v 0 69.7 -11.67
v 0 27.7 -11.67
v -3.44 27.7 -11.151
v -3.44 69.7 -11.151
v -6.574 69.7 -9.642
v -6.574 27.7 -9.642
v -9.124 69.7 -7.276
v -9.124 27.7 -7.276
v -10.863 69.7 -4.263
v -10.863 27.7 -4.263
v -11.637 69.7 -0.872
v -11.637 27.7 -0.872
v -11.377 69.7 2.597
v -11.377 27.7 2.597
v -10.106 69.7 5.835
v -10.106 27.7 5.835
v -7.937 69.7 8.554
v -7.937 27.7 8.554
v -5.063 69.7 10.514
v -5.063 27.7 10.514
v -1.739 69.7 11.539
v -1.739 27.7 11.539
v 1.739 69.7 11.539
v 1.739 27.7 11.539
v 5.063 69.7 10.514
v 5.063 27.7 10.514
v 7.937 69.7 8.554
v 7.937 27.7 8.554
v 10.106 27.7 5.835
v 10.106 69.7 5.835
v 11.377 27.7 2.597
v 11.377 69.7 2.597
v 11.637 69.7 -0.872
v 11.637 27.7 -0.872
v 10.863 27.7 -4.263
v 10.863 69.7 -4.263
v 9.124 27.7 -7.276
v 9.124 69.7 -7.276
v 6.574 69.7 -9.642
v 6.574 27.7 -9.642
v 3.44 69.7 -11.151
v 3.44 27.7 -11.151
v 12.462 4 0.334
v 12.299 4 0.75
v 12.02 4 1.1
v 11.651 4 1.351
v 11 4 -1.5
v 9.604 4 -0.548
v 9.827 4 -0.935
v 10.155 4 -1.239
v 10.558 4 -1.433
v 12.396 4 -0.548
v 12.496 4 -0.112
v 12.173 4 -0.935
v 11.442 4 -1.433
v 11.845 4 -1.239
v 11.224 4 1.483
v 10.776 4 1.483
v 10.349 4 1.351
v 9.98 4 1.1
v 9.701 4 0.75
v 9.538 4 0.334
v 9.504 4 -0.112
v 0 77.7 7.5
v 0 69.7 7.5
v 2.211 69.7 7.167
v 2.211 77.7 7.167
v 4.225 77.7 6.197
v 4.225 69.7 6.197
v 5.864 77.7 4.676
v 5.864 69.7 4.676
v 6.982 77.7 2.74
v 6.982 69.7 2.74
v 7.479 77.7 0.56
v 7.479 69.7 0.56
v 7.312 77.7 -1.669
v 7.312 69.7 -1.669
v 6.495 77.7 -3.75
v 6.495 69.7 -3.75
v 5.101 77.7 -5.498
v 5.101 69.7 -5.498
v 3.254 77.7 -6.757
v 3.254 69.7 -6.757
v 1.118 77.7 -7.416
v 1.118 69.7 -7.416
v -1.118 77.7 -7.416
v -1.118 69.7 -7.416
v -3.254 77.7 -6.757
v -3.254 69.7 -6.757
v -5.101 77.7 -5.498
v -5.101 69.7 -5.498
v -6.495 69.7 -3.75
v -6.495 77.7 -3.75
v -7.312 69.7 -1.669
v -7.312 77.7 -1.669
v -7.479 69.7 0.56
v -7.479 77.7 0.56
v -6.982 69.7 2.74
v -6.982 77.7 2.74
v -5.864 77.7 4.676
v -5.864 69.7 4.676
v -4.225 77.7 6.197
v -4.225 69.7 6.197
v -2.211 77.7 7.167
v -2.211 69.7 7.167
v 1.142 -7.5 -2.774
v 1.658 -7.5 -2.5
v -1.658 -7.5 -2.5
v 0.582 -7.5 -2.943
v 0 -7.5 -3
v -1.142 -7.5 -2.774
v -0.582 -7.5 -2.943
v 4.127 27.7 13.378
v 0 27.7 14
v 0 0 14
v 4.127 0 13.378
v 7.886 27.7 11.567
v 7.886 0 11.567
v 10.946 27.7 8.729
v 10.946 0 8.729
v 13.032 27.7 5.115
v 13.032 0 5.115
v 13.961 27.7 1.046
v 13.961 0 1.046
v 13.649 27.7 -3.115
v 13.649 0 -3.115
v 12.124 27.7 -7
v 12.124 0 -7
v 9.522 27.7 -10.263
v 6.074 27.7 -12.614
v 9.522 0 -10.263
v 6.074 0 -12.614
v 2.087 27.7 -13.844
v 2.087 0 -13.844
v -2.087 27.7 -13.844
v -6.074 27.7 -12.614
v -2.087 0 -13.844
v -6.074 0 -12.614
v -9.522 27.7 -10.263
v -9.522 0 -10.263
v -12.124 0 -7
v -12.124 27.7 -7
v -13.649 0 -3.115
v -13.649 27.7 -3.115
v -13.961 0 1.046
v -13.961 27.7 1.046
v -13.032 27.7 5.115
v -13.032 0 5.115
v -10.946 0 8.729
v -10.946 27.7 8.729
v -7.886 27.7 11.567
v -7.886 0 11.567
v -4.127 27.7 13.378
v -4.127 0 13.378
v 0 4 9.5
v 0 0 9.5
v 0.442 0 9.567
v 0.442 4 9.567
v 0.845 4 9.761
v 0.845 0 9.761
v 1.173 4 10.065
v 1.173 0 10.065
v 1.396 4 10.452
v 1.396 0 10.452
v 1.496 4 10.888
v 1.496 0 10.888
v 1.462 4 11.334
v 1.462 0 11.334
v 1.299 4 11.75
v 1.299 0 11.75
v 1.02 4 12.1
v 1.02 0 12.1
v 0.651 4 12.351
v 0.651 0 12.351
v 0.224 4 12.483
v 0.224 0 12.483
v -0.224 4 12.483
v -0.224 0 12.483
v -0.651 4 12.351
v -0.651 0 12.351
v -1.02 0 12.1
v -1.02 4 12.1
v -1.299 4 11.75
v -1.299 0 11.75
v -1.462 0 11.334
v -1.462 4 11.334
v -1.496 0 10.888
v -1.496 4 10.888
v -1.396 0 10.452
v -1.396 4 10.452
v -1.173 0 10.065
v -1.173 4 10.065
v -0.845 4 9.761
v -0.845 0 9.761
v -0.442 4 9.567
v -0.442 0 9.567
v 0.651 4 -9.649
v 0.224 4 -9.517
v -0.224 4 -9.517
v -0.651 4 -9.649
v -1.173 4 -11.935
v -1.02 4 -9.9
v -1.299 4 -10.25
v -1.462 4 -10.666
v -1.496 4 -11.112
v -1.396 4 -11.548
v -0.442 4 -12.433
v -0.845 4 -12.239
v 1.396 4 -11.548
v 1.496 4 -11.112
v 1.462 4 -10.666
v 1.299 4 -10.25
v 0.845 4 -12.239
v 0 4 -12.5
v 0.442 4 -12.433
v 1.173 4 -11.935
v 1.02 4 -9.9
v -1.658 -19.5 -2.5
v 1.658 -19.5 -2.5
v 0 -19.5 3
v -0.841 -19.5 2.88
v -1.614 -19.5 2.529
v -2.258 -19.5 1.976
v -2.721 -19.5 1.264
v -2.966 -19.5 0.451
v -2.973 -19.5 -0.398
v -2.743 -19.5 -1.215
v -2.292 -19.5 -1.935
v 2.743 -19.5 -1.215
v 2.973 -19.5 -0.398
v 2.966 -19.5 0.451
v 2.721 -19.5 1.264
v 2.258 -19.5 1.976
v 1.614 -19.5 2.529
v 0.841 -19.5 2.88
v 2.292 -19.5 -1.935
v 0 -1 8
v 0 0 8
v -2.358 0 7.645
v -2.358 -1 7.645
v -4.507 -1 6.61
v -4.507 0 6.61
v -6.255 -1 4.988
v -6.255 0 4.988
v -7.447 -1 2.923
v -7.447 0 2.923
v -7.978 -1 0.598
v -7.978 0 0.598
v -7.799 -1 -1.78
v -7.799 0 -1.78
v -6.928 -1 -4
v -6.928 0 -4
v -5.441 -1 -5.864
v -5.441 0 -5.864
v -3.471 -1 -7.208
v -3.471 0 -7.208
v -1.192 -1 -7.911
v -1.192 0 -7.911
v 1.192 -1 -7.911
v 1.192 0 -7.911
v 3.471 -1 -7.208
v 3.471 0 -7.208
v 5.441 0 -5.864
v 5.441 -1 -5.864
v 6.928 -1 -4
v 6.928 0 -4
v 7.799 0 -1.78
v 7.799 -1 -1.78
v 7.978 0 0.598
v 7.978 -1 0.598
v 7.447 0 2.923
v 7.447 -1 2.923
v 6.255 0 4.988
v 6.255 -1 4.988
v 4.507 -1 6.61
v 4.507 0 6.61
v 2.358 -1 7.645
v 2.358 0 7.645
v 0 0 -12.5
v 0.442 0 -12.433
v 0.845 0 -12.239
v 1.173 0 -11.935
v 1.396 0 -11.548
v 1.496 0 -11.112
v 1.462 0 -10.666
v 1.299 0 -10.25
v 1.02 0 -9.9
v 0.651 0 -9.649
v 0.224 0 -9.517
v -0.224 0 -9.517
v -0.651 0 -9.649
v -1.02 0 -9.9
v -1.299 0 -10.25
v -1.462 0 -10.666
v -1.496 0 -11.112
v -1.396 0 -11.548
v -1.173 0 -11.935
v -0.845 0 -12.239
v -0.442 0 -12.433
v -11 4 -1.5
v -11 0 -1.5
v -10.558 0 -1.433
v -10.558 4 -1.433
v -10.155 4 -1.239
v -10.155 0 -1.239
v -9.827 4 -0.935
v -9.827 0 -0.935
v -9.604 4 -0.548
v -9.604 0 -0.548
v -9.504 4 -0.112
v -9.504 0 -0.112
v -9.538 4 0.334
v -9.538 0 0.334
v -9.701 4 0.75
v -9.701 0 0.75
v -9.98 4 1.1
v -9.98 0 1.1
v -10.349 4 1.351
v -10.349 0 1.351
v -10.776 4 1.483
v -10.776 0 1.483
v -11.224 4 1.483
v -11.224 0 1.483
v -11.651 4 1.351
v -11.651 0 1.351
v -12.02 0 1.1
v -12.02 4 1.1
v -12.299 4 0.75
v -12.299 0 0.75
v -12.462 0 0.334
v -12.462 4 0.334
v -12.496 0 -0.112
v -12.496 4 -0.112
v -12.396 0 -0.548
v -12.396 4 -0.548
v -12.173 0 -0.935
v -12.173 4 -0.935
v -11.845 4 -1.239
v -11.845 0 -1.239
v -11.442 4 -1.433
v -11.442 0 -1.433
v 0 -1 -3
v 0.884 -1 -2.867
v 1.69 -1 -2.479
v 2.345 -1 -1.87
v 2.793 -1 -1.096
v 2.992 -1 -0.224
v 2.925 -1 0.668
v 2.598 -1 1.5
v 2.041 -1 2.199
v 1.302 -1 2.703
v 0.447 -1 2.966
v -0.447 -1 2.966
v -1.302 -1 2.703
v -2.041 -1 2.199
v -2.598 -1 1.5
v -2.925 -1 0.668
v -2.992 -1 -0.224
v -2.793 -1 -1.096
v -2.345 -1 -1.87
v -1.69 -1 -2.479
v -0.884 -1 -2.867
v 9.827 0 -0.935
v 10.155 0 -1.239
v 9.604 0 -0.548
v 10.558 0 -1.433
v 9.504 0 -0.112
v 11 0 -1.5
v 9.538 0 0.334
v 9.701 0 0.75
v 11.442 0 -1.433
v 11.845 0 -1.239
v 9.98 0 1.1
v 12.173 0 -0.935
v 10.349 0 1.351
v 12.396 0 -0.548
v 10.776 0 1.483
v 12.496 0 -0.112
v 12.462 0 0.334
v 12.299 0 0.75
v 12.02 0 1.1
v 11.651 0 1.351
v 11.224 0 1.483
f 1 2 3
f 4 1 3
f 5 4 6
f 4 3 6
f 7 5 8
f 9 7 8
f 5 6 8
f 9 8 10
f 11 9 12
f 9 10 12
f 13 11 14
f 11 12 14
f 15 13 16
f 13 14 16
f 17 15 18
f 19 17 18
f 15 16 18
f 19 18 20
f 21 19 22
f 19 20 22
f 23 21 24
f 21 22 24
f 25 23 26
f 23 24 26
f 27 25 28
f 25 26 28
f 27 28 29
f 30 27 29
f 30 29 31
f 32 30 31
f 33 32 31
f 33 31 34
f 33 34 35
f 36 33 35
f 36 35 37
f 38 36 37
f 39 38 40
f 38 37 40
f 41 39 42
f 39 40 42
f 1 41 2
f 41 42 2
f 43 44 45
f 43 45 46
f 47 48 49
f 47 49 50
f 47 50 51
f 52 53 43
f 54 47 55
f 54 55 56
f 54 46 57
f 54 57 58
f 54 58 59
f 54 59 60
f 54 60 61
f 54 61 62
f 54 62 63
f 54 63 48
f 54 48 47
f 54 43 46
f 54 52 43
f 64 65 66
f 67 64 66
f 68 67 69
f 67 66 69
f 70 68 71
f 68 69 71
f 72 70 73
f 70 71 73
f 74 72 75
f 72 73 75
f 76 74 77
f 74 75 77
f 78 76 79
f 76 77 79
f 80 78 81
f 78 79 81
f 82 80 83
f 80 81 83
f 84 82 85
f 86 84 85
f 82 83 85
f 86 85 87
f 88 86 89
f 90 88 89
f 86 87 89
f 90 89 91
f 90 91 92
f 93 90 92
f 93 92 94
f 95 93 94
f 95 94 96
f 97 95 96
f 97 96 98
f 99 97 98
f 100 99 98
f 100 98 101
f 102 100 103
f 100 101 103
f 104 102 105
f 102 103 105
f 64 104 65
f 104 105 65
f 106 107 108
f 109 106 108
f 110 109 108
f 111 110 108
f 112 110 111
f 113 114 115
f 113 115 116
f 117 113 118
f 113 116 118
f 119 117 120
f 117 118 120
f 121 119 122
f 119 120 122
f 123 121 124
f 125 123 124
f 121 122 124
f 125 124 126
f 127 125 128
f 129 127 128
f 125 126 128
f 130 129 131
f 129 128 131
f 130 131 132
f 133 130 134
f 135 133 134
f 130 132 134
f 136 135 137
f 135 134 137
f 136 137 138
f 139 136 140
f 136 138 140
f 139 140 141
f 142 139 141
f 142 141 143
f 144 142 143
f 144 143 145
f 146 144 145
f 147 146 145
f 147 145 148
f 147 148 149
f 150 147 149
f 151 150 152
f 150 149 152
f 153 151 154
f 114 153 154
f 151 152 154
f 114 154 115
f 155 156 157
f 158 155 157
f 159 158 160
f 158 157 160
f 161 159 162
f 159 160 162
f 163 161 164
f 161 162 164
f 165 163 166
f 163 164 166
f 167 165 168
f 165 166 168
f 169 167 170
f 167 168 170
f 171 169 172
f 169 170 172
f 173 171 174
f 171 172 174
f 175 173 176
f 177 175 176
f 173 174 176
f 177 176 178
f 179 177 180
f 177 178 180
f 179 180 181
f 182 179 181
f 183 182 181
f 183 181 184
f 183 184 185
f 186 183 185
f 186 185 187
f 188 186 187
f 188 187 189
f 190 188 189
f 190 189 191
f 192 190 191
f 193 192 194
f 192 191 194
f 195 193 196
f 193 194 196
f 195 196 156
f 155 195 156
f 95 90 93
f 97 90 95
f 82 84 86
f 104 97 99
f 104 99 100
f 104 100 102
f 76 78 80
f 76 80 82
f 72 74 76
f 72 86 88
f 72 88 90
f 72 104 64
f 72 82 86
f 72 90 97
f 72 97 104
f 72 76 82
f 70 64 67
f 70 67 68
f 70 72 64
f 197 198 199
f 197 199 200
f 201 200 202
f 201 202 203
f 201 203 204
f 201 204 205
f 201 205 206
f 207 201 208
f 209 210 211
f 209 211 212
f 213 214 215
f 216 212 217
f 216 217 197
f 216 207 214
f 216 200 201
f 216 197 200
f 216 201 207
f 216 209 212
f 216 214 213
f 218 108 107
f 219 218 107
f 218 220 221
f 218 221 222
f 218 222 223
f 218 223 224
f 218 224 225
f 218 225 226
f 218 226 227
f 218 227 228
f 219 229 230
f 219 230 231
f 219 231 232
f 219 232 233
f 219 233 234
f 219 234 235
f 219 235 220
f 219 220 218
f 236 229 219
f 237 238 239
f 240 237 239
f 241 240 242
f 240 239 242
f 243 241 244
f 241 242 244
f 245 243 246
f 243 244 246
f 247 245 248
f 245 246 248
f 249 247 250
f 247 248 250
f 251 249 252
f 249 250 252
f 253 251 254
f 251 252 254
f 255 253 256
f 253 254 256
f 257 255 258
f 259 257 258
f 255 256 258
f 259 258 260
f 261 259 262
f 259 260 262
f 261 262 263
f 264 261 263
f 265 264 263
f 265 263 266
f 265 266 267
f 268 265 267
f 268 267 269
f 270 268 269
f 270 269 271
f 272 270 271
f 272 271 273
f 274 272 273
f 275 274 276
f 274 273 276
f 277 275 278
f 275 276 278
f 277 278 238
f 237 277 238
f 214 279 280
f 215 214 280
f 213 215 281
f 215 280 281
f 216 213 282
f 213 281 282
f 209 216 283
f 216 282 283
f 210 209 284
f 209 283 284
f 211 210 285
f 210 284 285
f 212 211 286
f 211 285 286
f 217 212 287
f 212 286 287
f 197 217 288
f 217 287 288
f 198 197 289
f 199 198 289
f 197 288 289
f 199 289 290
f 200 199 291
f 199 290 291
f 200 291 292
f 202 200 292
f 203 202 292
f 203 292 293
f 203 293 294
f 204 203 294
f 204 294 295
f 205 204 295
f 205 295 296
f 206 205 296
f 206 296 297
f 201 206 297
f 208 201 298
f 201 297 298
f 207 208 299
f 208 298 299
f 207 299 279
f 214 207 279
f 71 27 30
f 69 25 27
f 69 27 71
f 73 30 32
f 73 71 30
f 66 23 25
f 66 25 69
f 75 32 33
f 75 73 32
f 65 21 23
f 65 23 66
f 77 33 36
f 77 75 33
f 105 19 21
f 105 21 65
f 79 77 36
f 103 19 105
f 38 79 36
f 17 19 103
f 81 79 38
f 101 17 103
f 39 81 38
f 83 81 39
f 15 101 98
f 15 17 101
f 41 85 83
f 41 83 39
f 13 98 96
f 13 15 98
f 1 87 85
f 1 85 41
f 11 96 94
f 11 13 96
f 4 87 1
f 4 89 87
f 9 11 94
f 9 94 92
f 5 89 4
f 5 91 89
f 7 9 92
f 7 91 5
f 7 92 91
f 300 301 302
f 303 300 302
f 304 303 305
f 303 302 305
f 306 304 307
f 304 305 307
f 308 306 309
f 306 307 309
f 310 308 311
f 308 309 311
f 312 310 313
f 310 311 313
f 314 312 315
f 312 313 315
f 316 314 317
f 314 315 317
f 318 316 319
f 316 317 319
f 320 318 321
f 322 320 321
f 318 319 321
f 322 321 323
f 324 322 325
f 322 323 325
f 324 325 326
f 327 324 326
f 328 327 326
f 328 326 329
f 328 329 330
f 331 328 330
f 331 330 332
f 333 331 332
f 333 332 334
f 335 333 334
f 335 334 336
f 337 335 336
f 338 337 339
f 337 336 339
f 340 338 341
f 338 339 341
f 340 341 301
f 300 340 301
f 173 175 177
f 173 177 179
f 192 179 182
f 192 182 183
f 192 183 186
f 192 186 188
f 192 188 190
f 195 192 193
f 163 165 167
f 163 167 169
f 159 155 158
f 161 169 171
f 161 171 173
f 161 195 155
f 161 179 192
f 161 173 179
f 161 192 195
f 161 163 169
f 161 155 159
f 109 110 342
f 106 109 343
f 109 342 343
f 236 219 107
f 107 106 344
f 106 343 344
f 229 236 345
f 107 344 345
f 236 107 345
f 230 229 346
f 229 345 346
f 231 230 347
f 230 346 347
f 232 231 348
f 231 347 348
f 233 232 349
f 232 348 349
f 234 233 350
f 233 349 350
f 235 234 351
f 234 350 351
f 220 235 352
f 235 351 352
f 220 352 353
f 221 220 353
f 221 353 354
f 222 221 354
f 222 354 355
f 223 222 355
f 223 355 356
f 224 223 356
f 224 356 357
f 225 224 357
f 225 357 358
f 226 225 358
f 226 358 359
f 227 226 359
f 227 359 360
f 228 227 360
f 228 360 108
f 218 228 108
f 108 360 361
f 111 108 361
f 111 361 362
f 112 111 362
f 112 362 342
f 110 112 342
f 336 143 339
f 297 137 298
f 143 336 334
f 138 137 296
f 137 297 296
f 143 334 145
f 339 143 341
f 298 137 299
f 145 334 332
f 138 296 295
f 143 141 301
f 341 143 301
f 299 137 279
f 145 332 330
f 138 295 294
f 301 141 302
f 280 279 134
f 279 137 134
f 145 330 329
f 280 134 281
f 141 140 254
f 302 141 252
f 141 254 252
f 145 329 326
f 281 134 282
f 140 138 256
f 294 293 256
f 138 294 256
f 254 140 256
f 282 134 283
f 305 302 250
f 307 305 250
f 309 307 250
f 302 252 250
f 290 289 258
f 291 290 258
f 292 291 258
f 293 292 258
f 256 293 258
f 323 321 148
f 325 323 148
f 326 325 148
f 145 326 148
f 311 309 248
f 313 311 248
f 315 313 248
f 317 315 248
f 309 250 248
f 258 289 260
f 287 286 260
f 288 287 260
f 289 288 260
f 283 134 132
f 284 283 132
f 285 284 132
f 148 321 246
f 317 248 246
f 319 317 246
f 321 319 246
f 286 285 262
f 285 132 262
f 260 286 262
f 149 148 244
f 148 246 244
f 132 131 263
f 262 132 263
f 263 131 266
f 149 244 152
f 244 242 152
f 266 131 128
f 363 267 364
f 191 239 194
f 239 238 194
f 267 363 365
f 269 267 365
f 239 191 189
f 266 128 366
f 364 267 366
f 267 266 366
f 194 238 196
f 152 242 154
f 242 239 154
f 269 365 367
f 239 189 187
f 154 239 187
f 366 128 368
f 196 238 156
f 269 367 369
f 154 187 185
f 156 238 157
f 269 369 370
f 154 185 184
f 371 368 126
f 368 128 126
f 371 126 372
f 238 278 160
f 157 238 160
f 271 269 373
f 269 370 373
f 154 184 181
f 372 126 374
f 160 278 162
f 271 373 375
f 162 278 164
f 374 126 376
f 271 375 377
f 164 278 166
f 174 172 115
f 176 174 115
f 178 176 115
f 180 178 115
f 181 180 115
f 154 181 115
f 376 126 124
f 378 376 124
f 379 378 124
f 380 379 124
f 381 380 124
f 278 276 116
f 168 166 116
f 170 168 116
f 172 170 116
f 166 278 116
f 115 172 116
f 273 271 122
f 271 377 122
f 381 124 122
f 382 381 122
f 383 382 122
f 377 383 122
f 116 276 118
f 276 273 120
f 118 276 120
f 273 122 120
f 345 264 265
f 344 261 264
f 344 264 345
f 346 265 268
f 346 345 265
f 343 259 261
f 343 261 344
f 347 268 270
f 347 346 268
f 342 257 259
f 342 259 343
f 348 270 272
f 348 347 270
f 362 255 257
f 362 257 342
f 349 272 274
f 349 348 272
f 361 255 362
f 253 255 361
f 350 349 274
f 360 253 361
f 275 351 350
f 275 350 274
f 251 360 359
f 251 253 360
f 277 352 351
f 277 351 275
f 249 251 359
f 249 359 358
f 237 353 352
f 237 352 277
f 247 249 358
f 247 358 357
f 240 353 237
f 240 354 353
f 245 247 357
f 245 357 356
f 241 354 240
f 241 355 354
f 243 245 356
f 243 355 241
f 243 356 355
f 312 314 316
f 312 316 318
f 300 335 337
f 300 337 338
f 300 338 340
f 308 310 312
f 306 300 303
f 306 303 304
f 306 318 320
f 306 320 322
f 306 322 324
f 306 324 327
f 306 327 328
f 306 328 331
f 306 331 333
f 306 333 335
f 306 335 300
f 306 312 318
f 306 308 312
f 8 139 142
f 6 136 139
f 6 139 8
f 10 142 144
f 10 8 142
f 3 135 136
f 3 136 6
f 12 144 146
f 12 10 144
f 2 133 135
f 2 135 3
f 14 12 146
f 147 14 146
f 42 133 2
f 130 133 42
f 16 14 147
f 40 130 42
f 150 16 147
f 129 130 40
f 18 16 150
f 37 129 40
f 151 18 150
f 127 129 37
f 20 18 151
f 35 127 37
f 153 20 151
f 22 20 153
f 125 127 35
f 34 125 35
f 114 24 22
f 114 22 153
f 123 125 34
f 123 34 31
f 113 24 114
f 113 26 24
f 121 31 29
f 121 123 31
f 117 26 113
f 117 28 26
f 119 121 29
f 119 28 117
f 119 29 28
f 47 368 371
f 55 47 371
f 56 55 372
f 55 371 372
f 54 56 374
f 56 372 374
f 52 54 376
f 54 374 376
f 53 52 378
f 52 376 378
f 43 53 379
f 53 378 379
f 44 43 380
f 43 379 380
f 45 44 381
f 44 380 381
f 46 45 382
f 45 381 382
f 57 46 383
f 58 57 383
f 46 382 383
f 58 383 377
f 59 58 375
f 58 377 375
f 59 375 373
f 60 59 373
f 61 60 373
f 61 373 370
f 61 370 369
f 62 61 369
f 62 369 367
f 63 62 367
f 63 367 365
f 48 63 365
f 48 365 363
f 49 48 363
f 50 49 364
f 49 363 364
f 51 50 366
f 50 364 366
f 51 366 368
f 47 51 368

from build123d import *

# Parameters (mm, degrees)
SKETCH_1_R          = 14
EXTRUDE_1_DEPTH     = 27.7
SKETCH_3_R          = 11.669632126
EXTRUDE_2_DEPTH     = 42
SKETCH_8_R          = 7.5
EXTRUDE_4_DEPTH     = 8
SKETCH_9_R          = 8
EXTRUDE_5_DEPTH     = 1
SKETCH_5_R          = 3
EXTRUDE_3_DEPTH     = 18.5
CUT_EXTRUDE_START   = -12
CUT_EXTRUDE_2_DEPTH = 12
SKETCH_4_R          = 1.5
CUT_EXTRUDE_1_DEPTH = 4


with BuildPart() as part:
    # 草图1 → 凸台-拉伸1 (new body)
    with BuildSketch(Plane(origin=(0, 0, 0), x_dir=(1, 0, 0), z_dir=(0, 1, 0))):
        with Locations(Location((0, 0, 0), (0, 0, 270))):
            Circle(SKETCH_1_R)
    extrude(amount=EXTRUDE_1_DEPTH)

    # 草图3 → 凸台-拉伸2 (add)
    with BuildSketch(Plane(origin=(0, 27.7, 0), x_dir=(1, 0, 0), z_dir=(0, 1, 0))):
        with Locations(Location((0, 0, 0), (0, 0, 90))):
            Circle(SKETCH_3_R)
    extrude(amount=EXTRUDE_2_DEPTH)

    # 草图8 → 凸台-拉伸4 (add)
    with BuildSketch(Plane(origin=(0, 69.7, 0), x_dir=(1, 0, 0), z_dir=(0, 1, 0))):
        with Locations(Location((0, 0, 0), (0, 0, 270))):
            Circle(SKETCH_8_R)
    extrude(amount=EXTRUDE_4_DEPTH)

    # 草图9 → 凸台-拉伸5 (add)
    with BuildSketch(Plane.XZ):
        with Locations(Location((0, 0, 0), (0, 0, 90))):
            Circle(SKETCH_9_R)
    extrude(amount=EXTRUDE_5_DEPTH)

    # 草图5 → 凸台-拉伸3 (add)
    with BuildSketch(Plane.XZ.offset(1)):
        with Locations(Location((0, 0, 0), (0, 0, 270))):
            Circle(SKETCH_5_R)
    extrude(amount=EXTRUDE_3_DEPTH)

    # 草图7 → 切除-拉伸2 (cut)
    with BuildSketch(Plane.XZ.offset(19.5).offset(CUT_EXTRUDE_START)):
        with BuildLine():
            Line((-1.658312395, -2.5), (1.658312395, -2.5))
            ThreePointArc((1.658312395, -2.5), (0, -3), (-1.658312395, -2.5))
        make_face()
    extrude(amount=CUT_EXTRUDE_2_DEPTH, mode=Mode.SUBTRACT)

    # 草图4 → 切除-拉伸1 (cut)
    with BuildSketch(Plane.XZ):
        with Locations(Location((0, 11, 0), (0, 0, 270))):
            Circle(SKETCH_4_R)
        with Locations(Location((11, 0, 0), (0, 0, 270))):
            Circle(SKETCH_4_R)
        with Locations(Location((0, -11, 0), (0, 0, 270))):
            Circle(SKETCH_4_R)
        with Locations(Location((-11, 0, 0), (0, 0, 270))):
            Circle(SKETCH_4_R)
    extrude(amount=-CUT_EXTRUDE_1_DEPTH, mode=Mode.SUBTRACT)


solid = part.part
